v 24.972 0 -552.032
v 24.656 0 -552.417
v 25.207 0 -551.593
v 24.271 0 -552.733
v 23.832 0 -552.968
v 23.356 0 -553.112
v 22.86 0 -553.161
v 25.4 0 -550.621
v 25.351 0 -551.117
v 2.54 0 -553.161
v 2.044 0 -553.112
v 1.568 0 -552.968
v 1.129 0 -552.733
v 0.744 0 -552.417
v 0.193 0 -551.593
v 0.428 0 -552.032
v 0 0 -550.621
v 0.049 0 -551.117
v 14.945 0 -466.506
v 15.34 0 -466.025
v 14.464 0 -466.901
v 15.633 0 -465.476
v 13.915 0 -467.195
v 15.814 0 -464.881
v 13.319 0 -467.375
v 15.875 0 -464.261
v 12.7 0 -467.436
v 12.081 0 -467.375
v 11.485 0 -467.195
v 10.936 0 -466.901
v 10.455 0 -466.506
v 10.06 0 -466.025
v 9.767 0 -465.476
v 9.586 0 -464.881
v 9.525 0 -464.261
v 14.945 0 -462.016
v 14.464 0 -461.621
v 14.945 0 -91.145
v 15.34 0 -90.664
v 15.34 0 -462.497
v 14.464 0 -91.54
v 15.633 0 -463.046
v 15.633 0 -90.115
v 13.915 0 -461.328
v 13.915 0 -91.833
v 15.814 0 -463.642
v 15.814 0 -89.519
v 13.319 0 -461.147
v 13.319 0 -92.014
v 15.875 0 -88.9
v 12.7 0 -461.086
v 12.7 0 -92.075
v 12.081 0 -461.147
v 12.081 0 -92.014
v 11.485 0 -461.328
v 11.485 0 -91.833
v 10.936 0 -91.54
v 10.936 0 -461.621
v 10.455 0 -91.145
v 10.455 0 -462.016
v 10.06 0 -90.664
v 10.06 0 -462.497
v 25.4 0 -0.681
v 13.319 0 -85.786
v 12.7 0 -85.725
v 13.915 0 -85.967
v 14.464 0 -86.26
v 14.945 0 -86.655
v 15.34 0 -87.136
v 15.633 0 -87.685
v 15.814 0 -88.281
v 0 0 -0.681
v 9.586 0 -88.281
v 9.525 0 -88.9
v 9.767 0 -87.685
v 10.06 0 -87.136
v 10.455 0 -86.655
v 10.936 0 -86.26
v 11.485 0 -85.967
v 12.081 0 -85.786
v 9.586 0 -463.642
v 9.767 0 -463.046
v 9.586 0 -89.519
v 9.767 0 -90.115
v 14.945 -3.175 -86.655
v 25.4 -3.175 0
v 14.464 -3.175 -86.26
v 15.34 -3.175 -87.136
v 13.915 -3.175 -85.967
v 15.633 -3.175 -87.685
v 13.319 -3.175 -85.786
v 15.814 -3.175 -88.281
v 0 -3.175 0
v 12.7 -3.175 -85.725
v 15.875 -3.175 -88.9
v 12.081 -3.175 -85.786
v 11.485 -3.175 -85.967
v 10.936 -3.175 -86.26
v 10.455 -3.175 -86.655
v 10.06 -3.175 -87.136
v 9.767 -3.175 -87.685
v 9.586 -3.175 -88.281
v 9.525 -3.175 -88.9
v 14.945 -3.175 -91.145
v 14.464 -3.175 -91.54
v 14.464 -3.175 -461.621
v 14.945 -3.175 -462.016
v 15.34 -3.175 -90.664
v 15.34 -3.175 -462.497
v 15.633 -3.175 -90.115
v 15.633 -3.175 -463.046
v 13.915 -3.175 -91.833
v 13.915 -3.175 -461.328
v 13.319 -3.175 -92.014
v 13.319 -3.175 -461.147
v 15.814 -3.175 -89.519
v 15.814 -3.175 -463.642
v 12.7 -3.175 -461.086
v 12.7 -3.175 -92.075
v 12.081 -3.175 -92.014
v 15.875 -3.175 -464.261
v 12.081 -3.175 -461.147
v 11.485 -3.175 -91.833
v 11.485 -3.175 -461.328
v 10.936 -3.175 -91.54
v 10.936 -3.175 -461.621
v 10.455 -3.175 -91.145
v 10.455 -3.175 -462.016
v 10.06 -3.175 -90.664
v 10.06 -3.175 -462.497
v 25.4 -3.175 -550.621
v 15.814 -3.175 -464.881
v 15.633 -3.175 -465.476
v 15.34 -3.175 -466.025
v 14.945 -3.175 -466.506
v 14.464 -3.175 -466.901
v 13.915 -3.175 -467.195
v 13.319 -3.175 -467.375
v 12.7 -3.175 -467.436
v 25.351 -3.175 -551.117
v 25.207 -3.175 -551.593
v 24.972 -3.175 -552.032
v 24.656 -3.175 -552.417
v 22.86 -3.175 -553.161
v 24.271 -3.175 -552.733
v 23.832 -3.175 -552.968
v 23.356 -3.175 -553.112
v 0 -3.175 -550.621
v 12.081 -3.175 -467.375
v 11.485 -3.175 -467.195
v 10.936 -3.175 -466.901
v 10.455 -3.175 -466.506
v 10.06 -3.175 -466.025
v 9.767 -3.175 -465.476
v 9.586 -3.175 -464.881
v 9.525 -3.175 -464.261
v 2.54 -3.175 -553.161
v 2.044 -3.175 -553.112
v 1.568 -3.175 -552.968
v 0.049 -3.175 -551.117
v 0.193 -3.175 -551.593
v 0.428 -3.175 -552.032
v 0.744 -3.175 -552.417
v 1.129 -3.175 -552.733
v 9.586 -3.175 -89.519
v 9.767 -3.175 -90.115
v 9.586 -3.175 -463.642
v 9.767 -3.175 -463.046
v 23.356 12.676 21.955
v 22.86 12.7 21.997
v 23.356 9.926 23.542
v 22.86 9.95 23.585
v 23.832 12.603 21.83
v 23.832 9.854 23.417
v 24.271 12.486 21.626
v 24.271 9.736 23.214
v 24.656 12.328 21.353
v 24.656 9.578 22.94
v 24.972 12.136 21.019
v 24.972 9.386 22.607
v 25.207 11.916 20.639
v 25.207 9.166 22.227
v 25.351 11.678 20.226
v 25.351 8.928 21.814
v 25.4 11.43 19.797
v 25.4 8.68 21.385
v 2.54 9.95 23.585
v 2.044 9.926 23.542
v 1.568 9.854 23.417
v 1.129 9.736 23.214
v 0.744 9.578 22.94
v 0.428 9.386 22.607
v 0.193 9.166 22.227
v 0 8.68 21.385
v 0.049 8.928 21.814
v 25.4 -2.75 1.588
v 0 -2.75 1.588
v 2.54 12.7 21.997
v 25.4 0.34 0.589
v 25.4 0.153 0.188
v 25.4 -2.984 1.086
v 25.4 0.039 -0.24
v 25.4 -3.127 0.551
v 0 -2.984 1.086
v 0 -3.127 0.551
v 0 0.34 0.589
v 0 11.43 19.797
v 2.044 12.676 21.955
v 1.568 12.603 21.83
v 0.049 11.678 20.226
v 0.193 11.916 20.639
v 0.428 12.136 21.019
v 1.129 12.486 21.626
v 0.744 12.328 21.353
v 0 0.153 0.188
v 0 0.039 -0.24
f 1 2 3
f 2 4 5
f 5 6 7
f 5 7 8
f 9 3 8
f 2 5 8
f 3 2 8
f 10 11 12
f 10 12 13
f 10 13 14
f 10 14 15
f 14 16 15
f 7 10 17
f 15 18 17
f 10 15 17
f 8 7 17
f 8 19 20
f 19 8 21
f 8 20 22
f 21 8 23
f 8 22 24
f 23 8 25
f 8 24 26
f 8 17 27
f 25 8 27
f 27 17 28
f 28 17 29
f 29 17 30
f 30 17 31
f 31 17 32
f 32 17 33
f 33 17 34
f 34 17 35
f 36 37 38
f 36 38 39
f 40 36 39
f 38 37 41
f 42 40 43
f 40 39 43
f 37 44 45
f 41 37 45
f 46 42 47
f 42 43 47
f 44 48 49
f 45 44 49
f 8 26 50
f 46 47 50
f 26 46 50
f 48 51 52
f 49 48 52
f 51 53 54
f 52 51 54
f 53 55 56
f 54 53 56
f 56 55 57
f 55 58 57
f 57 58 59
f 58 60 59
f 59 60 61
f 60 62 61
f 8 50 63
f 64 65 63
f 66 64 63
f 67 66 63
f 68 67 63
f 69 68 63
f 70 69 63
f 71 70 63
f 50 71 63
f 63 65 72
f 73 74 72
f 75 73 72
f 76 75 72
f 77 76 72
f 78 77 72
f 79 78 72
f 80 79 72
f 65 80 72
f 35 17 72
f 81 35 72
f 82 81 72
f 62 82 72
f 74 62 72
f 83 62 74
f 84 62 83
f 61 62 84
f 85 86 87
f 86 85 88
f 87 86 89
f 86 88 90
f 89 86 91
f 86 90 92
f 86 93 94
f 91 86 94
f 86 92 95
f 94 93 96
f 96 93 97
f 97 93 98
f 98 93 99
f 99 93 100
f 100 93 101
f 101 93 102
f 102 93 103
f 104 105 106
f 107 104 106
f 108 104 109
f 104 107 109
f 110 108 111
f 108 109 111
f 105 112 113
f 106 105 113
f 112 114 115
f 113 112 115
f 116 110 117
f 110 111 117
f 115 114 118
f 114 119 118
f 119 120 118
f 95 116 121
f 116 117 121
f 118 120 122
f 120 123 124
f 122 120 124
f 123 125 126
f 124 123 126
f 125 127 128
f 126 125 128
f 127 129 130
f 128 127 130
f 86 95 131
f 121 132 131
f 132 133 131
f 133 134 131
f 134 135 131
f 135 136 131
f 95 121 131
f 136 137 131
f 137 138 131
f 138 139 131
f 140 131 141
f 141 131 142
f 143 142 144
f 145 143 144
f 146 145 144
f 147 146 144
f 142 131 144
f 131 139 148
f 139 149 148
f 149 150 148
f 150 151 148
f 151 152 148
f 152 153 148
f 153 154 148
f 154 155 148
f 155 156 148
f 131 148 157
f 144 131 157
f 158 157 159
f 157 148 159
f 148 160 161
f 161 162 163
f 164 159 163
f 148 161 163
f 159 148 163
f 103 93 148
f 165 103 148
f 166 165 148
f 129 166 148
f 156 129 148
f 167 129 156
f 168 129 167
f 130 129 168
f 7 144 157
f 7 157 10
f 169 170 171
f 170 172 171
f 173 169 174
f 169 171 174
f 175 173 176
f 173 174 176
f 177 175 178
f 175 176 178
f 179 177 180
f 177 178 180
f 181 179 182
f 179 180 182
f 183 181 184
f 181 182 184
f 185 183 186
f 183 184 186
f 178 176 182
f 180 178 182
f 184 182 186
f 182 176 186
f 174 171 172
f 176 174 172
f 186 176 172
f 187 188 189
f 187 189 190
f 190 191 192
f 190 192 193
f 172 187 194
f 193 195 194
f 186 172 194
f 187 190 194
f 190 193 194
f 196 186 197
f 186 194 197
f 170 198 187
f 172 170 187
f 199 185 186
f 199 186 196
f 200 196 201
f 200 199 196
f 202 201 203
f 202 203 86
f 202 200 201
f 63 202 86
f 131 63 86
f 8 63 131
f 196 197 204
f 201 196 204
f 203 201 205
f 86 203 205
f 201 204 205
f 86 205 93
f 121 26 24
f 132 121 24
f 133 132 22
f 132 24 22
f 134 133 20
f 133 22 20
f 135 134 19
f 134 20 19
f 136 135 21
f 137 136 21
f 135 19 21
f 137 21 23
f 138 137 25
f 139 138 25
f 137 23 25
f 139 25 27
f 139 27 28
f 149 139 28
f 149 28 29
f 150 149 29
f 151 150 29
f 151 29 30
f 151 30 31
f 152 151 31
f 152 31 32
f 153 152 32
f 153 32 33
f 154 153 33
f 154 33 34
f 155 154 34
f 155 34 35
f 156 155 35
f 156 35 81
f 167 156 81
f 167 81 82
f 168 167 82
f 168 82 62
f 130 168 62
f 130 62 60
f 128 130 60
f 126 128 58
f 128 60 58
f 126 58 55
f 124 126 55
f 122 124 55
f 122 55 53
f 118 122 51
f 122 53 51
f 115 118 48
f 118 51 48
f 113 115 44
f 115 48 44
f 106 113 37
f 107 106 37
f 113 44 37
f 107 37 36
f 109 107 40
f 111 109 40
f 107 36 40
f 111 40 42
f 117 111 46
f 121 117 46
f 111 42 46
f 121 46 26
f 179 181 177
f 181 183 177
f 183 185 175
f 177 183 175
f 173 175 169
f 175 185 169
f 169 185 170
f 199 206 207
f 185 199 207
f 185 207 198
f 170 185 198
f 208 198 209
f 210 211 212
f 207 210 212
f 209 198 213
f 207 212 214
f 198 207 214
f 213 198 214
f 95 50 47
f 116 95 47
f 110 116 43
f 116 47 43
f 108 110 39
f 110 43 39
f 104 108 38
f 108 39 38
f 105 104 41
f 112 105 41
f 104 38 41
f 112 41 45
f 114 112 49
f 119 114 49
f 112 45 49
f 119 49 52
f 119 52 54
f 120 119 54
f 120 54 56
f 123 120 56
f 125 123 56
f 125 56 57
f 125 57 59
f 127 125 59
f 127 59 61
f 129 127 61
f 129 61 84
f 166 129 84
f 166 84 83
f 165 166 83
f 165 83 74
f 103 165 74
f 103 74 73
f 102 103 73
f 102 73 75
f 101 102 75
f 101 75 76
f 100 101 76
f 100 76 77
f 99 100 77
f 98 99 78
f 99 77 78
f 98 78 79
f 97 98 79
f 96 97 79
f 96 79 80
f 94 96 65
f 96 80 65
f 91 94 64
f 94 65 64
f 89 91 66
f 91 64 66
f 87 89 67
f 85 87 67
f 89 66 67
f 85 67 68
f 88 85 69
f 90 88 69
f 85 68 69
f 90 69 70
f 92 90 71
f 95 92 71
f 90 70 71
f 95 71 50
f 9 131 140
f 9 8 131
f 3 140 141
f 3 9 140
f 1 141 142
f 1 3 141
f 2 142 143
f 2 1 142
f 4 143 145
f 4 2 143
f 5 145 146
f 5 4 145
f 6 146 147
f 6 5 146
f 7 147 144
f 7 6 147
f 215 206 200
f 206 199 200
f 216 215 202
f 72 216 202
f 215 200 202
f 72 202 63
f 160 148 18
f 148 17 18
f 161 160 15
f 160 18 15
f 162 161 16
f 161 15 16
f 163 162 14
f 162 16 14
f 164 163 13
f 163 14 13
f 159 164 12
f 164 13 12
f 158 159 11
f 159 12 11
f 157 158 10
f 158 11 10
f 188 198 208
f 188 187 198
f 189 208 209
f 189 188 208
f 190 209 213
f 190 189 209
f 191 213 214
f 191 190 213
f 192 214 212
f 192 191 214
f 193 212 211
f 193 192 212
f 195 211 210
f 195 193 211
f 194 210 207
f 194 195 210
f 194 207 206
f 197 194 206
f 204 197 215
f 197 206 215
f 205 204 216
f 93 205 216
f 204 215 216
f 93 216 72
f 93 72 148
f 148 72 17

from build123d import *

# Parameters (mm, degrees)
BOSS_EXTRUDE1_DEPTH = 25.4
SKETCH2_R           = 3.175
CUT_EXTRUDE1_DEPTH  = 4.175
FILLET1_R           = 2.54


with BuildPart() as part:
    # Sketch1 → Boss-Extrude1 (new body)
    with BuildSketch(Plane(origin=(0, 0, 0), x_dir=(0, 0, -1), z_dir=(1, 0, 0))):
        with BuildLine():
            Line((0, 0), (-21.997045256, 12.7))
            Line((-21.997045256, 12.7), (-23.584545256, 9.950369343))
            Line((-23.584545256, 9.950369343), (-1.5875, -2.749630657))
            ThreePointArc((-1.5875, -2.749630657), (-0.821750468, -3.066814498), (0, -3.175))
            Line((0, -3.175), (553.1612, -3.175))
            Line((553.1612, -3.175), (553.1612, 0))
            Line((553.1612, 0), (0, 0))
        make_face()
    extrude(amount=BOSS_EXTRUDE1_DEPTH)

    # Sketch2 → Cut-Extrude1 (cut, through all)
    with BuildSketch(Plane(origin=(0, 0, 0), x_dir=(1, 0, 0), z_dir=(0, 1, 0))):
        with Locations((12.7, 88.9)):
            Circle(SKETCH2_R)
        with Locations((12.7, 464.2612)):
            Circle(SKETCH2_R)
    extrude(amount=-CUT_EXTRUDE1_DEPTH, mode=Mode.SUBTRACT)

    # Fillet1
    fillet1_edges = [part.edges().sort_by_distance(p)[0] for p in [
        (25.4, 11.325184671, 22.790795256),
        (12.7, 0, 0),
        (25.4, -1.5875, -553.1612),
        (0, -1.5875, -553.1612),
        (0, 11.325184671, 22.790795256),
    ]]
    fillet(fillet1_edges, radius=FILLET1_R)


solid = part.part
